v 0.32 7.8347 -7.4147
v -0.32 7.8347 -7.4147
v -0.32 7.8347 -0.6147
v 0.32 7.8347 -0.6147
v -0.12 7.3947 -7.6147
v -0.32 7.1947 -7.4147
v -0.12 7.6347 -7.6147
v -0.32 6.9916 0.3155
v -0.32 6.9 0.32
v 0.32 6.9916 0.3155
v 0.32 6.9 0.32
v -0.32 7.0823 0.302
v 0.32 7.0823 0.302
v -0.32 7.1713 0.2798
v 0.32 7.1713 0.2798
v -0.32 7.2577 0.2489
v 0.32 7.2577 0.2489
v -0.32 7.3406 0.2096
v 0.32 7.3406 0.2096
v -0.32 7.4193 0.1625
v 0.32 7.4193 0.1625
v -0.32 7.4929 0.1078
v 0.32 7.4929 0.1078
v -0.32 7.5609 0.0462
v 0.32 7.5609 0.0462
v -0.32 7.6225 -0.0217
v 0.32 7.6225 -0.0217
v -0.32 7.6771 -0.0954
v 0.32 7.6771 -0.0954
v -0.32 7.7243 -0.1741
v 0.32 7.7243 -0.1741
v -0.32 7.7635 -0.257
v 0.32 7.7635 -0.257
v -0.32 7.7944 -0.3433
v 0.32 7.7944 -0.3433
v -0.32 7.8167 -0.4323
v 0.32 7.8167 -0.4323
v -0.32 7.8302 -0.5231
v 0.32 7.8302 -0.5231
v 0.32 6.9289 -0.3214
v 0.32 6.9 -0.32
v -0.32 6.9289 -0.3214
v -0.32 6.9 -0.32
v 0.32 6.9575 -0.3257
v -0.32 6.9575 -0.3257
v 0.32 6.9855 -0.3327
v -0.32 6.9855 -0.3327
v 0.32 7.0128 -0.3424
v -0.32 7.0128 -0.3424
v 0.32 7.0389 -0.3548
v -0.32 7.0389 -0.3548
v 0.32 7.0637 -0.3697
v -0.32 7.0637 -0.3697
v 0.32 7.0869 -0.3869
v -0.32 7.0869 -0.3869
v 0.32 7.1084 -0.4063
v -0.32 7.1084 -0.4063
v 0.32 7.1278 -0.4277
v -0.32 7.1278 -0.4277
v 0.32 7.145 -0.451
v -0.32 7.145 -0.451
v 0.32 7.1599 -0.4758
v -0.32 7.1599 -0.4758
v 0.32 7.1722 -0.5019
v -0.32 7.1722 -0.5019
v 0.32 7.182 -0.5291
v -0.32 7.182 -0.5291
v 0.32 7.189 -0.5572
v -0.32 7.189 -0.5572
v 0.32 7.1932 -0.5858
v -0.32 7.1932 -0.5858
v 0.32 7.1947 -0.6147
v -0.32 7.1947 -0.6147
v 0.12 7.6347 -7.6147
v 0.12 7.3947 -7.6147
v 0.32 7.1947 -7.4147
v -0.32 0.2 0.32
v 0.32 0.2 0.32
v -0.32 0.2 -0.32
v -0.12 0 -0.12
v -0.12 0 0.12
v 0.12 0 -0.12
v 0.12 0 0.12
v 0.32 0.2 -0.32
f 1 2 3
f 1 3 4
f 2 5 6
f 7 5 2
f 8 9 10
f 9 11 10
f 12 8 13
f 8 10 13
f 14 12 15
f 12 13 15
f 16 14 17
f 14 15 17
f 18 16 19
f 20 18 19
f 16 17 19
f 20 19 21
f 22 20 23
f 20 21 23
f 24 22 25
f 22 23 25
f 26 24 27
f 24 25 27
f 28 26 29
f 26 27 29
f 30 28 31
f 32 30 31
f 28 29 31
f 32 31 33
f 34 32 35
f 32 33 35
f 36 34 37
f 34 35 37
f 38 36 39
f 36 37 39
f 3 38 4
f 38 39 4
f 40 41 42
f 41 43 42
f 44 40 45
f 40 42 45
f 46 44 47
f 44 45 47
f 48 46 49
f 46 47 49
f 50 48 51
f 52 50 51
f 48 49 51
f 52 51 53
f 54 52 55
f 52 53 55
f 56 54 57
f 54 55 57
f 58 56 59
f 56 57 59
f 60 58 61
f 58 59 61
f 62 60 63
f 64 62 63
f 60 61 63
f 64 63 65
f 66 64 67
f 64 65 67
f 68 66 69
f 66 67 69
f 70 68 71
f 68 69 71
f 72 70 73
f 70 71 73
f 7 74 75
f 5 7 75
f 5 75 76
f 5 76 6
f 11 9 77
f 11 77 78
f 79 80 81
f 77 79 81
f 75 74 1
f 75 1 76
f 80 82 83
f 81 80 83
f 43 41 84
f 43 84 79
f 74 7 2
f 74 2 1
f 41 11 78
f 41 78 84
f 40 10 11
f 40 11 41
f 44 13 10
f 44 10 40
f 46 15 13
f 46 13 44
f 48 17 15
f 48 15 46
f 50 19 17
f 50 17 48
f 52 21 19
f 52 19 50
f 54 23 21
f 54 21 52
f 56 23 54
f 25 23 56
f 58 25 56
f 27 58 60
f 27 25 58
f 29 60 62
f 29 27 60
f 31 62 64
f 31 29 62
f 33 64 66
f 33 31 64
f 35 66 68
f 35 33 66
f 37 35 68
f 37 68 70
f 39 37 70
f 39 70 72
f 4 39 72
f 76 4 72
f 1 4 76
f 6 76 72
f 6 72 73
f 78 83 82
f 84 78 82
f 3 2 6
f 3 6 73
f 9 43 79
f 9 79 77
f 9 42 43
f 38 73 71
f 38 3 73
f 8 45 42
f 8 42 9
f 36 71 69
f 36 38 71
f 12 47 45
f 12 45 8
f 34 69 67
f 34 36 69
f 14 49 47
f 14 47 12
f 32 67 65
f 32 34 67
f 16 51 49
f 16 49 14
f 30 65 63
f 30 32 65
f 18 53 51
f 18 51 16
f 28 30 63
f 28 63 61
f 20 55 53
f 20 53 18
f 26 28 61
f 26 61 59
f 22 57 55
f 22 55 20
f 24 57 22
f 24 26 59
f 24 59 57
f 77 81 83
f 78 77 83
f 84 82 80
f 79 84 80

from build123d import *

# Parameters (mm, degrees)
SKETCH1_W     = 0.64
SKETCH1_H     = 0.64
CHAMFER1_SIZE = 0.2


with BuildPart() as part:
    # Sweep1: sweep along a path in Sketch2
    with BuildLine(Plane(origin=(0, 0, 0), x_dir=(0, 0, -1), z_dir=(1, 0, 0))) as sweep1_path:
        Line((0.014667815, 0), (0.014667815, 6.9))
        ThreePointArc((0.014667815, 6.9), (0.190403746, 7.324264069), (0.614667815, 7.5))
        Line((0.614667815, 7.5), (7.614667815, 7.5))
    # Sketch1 → Sweep1 (sweep)
    with BuildSketch(Plane(origin=(0, 0, 0), x_dir=(1, 0, 0), z_dir=(0, 1, 0))):
        Rectangle(SKETCH1_W, SKETCH1_H)
    sweep(path=sweep1_path.line)

    # Chamfer1
    chamfer1_edges = [part.edges().sort_by_distance(p)[0] for p in [
        (0, 0, 0.32),
        (0.32, 0, 0),
        (0, 0, -0.32),
        (-0.32, 7.514667815, -7.614667815),
        (0, 7.834667815, -7.614667815),
        (0.32, 7.514667815, -7.614667815),
        (0, 7.194667815, -7.614667815),
        (-0.32, 0, 0),
    ]]
    chamfer(chamfer1_edges, length=CHAMFER1_SIZE)


solid = part.part
